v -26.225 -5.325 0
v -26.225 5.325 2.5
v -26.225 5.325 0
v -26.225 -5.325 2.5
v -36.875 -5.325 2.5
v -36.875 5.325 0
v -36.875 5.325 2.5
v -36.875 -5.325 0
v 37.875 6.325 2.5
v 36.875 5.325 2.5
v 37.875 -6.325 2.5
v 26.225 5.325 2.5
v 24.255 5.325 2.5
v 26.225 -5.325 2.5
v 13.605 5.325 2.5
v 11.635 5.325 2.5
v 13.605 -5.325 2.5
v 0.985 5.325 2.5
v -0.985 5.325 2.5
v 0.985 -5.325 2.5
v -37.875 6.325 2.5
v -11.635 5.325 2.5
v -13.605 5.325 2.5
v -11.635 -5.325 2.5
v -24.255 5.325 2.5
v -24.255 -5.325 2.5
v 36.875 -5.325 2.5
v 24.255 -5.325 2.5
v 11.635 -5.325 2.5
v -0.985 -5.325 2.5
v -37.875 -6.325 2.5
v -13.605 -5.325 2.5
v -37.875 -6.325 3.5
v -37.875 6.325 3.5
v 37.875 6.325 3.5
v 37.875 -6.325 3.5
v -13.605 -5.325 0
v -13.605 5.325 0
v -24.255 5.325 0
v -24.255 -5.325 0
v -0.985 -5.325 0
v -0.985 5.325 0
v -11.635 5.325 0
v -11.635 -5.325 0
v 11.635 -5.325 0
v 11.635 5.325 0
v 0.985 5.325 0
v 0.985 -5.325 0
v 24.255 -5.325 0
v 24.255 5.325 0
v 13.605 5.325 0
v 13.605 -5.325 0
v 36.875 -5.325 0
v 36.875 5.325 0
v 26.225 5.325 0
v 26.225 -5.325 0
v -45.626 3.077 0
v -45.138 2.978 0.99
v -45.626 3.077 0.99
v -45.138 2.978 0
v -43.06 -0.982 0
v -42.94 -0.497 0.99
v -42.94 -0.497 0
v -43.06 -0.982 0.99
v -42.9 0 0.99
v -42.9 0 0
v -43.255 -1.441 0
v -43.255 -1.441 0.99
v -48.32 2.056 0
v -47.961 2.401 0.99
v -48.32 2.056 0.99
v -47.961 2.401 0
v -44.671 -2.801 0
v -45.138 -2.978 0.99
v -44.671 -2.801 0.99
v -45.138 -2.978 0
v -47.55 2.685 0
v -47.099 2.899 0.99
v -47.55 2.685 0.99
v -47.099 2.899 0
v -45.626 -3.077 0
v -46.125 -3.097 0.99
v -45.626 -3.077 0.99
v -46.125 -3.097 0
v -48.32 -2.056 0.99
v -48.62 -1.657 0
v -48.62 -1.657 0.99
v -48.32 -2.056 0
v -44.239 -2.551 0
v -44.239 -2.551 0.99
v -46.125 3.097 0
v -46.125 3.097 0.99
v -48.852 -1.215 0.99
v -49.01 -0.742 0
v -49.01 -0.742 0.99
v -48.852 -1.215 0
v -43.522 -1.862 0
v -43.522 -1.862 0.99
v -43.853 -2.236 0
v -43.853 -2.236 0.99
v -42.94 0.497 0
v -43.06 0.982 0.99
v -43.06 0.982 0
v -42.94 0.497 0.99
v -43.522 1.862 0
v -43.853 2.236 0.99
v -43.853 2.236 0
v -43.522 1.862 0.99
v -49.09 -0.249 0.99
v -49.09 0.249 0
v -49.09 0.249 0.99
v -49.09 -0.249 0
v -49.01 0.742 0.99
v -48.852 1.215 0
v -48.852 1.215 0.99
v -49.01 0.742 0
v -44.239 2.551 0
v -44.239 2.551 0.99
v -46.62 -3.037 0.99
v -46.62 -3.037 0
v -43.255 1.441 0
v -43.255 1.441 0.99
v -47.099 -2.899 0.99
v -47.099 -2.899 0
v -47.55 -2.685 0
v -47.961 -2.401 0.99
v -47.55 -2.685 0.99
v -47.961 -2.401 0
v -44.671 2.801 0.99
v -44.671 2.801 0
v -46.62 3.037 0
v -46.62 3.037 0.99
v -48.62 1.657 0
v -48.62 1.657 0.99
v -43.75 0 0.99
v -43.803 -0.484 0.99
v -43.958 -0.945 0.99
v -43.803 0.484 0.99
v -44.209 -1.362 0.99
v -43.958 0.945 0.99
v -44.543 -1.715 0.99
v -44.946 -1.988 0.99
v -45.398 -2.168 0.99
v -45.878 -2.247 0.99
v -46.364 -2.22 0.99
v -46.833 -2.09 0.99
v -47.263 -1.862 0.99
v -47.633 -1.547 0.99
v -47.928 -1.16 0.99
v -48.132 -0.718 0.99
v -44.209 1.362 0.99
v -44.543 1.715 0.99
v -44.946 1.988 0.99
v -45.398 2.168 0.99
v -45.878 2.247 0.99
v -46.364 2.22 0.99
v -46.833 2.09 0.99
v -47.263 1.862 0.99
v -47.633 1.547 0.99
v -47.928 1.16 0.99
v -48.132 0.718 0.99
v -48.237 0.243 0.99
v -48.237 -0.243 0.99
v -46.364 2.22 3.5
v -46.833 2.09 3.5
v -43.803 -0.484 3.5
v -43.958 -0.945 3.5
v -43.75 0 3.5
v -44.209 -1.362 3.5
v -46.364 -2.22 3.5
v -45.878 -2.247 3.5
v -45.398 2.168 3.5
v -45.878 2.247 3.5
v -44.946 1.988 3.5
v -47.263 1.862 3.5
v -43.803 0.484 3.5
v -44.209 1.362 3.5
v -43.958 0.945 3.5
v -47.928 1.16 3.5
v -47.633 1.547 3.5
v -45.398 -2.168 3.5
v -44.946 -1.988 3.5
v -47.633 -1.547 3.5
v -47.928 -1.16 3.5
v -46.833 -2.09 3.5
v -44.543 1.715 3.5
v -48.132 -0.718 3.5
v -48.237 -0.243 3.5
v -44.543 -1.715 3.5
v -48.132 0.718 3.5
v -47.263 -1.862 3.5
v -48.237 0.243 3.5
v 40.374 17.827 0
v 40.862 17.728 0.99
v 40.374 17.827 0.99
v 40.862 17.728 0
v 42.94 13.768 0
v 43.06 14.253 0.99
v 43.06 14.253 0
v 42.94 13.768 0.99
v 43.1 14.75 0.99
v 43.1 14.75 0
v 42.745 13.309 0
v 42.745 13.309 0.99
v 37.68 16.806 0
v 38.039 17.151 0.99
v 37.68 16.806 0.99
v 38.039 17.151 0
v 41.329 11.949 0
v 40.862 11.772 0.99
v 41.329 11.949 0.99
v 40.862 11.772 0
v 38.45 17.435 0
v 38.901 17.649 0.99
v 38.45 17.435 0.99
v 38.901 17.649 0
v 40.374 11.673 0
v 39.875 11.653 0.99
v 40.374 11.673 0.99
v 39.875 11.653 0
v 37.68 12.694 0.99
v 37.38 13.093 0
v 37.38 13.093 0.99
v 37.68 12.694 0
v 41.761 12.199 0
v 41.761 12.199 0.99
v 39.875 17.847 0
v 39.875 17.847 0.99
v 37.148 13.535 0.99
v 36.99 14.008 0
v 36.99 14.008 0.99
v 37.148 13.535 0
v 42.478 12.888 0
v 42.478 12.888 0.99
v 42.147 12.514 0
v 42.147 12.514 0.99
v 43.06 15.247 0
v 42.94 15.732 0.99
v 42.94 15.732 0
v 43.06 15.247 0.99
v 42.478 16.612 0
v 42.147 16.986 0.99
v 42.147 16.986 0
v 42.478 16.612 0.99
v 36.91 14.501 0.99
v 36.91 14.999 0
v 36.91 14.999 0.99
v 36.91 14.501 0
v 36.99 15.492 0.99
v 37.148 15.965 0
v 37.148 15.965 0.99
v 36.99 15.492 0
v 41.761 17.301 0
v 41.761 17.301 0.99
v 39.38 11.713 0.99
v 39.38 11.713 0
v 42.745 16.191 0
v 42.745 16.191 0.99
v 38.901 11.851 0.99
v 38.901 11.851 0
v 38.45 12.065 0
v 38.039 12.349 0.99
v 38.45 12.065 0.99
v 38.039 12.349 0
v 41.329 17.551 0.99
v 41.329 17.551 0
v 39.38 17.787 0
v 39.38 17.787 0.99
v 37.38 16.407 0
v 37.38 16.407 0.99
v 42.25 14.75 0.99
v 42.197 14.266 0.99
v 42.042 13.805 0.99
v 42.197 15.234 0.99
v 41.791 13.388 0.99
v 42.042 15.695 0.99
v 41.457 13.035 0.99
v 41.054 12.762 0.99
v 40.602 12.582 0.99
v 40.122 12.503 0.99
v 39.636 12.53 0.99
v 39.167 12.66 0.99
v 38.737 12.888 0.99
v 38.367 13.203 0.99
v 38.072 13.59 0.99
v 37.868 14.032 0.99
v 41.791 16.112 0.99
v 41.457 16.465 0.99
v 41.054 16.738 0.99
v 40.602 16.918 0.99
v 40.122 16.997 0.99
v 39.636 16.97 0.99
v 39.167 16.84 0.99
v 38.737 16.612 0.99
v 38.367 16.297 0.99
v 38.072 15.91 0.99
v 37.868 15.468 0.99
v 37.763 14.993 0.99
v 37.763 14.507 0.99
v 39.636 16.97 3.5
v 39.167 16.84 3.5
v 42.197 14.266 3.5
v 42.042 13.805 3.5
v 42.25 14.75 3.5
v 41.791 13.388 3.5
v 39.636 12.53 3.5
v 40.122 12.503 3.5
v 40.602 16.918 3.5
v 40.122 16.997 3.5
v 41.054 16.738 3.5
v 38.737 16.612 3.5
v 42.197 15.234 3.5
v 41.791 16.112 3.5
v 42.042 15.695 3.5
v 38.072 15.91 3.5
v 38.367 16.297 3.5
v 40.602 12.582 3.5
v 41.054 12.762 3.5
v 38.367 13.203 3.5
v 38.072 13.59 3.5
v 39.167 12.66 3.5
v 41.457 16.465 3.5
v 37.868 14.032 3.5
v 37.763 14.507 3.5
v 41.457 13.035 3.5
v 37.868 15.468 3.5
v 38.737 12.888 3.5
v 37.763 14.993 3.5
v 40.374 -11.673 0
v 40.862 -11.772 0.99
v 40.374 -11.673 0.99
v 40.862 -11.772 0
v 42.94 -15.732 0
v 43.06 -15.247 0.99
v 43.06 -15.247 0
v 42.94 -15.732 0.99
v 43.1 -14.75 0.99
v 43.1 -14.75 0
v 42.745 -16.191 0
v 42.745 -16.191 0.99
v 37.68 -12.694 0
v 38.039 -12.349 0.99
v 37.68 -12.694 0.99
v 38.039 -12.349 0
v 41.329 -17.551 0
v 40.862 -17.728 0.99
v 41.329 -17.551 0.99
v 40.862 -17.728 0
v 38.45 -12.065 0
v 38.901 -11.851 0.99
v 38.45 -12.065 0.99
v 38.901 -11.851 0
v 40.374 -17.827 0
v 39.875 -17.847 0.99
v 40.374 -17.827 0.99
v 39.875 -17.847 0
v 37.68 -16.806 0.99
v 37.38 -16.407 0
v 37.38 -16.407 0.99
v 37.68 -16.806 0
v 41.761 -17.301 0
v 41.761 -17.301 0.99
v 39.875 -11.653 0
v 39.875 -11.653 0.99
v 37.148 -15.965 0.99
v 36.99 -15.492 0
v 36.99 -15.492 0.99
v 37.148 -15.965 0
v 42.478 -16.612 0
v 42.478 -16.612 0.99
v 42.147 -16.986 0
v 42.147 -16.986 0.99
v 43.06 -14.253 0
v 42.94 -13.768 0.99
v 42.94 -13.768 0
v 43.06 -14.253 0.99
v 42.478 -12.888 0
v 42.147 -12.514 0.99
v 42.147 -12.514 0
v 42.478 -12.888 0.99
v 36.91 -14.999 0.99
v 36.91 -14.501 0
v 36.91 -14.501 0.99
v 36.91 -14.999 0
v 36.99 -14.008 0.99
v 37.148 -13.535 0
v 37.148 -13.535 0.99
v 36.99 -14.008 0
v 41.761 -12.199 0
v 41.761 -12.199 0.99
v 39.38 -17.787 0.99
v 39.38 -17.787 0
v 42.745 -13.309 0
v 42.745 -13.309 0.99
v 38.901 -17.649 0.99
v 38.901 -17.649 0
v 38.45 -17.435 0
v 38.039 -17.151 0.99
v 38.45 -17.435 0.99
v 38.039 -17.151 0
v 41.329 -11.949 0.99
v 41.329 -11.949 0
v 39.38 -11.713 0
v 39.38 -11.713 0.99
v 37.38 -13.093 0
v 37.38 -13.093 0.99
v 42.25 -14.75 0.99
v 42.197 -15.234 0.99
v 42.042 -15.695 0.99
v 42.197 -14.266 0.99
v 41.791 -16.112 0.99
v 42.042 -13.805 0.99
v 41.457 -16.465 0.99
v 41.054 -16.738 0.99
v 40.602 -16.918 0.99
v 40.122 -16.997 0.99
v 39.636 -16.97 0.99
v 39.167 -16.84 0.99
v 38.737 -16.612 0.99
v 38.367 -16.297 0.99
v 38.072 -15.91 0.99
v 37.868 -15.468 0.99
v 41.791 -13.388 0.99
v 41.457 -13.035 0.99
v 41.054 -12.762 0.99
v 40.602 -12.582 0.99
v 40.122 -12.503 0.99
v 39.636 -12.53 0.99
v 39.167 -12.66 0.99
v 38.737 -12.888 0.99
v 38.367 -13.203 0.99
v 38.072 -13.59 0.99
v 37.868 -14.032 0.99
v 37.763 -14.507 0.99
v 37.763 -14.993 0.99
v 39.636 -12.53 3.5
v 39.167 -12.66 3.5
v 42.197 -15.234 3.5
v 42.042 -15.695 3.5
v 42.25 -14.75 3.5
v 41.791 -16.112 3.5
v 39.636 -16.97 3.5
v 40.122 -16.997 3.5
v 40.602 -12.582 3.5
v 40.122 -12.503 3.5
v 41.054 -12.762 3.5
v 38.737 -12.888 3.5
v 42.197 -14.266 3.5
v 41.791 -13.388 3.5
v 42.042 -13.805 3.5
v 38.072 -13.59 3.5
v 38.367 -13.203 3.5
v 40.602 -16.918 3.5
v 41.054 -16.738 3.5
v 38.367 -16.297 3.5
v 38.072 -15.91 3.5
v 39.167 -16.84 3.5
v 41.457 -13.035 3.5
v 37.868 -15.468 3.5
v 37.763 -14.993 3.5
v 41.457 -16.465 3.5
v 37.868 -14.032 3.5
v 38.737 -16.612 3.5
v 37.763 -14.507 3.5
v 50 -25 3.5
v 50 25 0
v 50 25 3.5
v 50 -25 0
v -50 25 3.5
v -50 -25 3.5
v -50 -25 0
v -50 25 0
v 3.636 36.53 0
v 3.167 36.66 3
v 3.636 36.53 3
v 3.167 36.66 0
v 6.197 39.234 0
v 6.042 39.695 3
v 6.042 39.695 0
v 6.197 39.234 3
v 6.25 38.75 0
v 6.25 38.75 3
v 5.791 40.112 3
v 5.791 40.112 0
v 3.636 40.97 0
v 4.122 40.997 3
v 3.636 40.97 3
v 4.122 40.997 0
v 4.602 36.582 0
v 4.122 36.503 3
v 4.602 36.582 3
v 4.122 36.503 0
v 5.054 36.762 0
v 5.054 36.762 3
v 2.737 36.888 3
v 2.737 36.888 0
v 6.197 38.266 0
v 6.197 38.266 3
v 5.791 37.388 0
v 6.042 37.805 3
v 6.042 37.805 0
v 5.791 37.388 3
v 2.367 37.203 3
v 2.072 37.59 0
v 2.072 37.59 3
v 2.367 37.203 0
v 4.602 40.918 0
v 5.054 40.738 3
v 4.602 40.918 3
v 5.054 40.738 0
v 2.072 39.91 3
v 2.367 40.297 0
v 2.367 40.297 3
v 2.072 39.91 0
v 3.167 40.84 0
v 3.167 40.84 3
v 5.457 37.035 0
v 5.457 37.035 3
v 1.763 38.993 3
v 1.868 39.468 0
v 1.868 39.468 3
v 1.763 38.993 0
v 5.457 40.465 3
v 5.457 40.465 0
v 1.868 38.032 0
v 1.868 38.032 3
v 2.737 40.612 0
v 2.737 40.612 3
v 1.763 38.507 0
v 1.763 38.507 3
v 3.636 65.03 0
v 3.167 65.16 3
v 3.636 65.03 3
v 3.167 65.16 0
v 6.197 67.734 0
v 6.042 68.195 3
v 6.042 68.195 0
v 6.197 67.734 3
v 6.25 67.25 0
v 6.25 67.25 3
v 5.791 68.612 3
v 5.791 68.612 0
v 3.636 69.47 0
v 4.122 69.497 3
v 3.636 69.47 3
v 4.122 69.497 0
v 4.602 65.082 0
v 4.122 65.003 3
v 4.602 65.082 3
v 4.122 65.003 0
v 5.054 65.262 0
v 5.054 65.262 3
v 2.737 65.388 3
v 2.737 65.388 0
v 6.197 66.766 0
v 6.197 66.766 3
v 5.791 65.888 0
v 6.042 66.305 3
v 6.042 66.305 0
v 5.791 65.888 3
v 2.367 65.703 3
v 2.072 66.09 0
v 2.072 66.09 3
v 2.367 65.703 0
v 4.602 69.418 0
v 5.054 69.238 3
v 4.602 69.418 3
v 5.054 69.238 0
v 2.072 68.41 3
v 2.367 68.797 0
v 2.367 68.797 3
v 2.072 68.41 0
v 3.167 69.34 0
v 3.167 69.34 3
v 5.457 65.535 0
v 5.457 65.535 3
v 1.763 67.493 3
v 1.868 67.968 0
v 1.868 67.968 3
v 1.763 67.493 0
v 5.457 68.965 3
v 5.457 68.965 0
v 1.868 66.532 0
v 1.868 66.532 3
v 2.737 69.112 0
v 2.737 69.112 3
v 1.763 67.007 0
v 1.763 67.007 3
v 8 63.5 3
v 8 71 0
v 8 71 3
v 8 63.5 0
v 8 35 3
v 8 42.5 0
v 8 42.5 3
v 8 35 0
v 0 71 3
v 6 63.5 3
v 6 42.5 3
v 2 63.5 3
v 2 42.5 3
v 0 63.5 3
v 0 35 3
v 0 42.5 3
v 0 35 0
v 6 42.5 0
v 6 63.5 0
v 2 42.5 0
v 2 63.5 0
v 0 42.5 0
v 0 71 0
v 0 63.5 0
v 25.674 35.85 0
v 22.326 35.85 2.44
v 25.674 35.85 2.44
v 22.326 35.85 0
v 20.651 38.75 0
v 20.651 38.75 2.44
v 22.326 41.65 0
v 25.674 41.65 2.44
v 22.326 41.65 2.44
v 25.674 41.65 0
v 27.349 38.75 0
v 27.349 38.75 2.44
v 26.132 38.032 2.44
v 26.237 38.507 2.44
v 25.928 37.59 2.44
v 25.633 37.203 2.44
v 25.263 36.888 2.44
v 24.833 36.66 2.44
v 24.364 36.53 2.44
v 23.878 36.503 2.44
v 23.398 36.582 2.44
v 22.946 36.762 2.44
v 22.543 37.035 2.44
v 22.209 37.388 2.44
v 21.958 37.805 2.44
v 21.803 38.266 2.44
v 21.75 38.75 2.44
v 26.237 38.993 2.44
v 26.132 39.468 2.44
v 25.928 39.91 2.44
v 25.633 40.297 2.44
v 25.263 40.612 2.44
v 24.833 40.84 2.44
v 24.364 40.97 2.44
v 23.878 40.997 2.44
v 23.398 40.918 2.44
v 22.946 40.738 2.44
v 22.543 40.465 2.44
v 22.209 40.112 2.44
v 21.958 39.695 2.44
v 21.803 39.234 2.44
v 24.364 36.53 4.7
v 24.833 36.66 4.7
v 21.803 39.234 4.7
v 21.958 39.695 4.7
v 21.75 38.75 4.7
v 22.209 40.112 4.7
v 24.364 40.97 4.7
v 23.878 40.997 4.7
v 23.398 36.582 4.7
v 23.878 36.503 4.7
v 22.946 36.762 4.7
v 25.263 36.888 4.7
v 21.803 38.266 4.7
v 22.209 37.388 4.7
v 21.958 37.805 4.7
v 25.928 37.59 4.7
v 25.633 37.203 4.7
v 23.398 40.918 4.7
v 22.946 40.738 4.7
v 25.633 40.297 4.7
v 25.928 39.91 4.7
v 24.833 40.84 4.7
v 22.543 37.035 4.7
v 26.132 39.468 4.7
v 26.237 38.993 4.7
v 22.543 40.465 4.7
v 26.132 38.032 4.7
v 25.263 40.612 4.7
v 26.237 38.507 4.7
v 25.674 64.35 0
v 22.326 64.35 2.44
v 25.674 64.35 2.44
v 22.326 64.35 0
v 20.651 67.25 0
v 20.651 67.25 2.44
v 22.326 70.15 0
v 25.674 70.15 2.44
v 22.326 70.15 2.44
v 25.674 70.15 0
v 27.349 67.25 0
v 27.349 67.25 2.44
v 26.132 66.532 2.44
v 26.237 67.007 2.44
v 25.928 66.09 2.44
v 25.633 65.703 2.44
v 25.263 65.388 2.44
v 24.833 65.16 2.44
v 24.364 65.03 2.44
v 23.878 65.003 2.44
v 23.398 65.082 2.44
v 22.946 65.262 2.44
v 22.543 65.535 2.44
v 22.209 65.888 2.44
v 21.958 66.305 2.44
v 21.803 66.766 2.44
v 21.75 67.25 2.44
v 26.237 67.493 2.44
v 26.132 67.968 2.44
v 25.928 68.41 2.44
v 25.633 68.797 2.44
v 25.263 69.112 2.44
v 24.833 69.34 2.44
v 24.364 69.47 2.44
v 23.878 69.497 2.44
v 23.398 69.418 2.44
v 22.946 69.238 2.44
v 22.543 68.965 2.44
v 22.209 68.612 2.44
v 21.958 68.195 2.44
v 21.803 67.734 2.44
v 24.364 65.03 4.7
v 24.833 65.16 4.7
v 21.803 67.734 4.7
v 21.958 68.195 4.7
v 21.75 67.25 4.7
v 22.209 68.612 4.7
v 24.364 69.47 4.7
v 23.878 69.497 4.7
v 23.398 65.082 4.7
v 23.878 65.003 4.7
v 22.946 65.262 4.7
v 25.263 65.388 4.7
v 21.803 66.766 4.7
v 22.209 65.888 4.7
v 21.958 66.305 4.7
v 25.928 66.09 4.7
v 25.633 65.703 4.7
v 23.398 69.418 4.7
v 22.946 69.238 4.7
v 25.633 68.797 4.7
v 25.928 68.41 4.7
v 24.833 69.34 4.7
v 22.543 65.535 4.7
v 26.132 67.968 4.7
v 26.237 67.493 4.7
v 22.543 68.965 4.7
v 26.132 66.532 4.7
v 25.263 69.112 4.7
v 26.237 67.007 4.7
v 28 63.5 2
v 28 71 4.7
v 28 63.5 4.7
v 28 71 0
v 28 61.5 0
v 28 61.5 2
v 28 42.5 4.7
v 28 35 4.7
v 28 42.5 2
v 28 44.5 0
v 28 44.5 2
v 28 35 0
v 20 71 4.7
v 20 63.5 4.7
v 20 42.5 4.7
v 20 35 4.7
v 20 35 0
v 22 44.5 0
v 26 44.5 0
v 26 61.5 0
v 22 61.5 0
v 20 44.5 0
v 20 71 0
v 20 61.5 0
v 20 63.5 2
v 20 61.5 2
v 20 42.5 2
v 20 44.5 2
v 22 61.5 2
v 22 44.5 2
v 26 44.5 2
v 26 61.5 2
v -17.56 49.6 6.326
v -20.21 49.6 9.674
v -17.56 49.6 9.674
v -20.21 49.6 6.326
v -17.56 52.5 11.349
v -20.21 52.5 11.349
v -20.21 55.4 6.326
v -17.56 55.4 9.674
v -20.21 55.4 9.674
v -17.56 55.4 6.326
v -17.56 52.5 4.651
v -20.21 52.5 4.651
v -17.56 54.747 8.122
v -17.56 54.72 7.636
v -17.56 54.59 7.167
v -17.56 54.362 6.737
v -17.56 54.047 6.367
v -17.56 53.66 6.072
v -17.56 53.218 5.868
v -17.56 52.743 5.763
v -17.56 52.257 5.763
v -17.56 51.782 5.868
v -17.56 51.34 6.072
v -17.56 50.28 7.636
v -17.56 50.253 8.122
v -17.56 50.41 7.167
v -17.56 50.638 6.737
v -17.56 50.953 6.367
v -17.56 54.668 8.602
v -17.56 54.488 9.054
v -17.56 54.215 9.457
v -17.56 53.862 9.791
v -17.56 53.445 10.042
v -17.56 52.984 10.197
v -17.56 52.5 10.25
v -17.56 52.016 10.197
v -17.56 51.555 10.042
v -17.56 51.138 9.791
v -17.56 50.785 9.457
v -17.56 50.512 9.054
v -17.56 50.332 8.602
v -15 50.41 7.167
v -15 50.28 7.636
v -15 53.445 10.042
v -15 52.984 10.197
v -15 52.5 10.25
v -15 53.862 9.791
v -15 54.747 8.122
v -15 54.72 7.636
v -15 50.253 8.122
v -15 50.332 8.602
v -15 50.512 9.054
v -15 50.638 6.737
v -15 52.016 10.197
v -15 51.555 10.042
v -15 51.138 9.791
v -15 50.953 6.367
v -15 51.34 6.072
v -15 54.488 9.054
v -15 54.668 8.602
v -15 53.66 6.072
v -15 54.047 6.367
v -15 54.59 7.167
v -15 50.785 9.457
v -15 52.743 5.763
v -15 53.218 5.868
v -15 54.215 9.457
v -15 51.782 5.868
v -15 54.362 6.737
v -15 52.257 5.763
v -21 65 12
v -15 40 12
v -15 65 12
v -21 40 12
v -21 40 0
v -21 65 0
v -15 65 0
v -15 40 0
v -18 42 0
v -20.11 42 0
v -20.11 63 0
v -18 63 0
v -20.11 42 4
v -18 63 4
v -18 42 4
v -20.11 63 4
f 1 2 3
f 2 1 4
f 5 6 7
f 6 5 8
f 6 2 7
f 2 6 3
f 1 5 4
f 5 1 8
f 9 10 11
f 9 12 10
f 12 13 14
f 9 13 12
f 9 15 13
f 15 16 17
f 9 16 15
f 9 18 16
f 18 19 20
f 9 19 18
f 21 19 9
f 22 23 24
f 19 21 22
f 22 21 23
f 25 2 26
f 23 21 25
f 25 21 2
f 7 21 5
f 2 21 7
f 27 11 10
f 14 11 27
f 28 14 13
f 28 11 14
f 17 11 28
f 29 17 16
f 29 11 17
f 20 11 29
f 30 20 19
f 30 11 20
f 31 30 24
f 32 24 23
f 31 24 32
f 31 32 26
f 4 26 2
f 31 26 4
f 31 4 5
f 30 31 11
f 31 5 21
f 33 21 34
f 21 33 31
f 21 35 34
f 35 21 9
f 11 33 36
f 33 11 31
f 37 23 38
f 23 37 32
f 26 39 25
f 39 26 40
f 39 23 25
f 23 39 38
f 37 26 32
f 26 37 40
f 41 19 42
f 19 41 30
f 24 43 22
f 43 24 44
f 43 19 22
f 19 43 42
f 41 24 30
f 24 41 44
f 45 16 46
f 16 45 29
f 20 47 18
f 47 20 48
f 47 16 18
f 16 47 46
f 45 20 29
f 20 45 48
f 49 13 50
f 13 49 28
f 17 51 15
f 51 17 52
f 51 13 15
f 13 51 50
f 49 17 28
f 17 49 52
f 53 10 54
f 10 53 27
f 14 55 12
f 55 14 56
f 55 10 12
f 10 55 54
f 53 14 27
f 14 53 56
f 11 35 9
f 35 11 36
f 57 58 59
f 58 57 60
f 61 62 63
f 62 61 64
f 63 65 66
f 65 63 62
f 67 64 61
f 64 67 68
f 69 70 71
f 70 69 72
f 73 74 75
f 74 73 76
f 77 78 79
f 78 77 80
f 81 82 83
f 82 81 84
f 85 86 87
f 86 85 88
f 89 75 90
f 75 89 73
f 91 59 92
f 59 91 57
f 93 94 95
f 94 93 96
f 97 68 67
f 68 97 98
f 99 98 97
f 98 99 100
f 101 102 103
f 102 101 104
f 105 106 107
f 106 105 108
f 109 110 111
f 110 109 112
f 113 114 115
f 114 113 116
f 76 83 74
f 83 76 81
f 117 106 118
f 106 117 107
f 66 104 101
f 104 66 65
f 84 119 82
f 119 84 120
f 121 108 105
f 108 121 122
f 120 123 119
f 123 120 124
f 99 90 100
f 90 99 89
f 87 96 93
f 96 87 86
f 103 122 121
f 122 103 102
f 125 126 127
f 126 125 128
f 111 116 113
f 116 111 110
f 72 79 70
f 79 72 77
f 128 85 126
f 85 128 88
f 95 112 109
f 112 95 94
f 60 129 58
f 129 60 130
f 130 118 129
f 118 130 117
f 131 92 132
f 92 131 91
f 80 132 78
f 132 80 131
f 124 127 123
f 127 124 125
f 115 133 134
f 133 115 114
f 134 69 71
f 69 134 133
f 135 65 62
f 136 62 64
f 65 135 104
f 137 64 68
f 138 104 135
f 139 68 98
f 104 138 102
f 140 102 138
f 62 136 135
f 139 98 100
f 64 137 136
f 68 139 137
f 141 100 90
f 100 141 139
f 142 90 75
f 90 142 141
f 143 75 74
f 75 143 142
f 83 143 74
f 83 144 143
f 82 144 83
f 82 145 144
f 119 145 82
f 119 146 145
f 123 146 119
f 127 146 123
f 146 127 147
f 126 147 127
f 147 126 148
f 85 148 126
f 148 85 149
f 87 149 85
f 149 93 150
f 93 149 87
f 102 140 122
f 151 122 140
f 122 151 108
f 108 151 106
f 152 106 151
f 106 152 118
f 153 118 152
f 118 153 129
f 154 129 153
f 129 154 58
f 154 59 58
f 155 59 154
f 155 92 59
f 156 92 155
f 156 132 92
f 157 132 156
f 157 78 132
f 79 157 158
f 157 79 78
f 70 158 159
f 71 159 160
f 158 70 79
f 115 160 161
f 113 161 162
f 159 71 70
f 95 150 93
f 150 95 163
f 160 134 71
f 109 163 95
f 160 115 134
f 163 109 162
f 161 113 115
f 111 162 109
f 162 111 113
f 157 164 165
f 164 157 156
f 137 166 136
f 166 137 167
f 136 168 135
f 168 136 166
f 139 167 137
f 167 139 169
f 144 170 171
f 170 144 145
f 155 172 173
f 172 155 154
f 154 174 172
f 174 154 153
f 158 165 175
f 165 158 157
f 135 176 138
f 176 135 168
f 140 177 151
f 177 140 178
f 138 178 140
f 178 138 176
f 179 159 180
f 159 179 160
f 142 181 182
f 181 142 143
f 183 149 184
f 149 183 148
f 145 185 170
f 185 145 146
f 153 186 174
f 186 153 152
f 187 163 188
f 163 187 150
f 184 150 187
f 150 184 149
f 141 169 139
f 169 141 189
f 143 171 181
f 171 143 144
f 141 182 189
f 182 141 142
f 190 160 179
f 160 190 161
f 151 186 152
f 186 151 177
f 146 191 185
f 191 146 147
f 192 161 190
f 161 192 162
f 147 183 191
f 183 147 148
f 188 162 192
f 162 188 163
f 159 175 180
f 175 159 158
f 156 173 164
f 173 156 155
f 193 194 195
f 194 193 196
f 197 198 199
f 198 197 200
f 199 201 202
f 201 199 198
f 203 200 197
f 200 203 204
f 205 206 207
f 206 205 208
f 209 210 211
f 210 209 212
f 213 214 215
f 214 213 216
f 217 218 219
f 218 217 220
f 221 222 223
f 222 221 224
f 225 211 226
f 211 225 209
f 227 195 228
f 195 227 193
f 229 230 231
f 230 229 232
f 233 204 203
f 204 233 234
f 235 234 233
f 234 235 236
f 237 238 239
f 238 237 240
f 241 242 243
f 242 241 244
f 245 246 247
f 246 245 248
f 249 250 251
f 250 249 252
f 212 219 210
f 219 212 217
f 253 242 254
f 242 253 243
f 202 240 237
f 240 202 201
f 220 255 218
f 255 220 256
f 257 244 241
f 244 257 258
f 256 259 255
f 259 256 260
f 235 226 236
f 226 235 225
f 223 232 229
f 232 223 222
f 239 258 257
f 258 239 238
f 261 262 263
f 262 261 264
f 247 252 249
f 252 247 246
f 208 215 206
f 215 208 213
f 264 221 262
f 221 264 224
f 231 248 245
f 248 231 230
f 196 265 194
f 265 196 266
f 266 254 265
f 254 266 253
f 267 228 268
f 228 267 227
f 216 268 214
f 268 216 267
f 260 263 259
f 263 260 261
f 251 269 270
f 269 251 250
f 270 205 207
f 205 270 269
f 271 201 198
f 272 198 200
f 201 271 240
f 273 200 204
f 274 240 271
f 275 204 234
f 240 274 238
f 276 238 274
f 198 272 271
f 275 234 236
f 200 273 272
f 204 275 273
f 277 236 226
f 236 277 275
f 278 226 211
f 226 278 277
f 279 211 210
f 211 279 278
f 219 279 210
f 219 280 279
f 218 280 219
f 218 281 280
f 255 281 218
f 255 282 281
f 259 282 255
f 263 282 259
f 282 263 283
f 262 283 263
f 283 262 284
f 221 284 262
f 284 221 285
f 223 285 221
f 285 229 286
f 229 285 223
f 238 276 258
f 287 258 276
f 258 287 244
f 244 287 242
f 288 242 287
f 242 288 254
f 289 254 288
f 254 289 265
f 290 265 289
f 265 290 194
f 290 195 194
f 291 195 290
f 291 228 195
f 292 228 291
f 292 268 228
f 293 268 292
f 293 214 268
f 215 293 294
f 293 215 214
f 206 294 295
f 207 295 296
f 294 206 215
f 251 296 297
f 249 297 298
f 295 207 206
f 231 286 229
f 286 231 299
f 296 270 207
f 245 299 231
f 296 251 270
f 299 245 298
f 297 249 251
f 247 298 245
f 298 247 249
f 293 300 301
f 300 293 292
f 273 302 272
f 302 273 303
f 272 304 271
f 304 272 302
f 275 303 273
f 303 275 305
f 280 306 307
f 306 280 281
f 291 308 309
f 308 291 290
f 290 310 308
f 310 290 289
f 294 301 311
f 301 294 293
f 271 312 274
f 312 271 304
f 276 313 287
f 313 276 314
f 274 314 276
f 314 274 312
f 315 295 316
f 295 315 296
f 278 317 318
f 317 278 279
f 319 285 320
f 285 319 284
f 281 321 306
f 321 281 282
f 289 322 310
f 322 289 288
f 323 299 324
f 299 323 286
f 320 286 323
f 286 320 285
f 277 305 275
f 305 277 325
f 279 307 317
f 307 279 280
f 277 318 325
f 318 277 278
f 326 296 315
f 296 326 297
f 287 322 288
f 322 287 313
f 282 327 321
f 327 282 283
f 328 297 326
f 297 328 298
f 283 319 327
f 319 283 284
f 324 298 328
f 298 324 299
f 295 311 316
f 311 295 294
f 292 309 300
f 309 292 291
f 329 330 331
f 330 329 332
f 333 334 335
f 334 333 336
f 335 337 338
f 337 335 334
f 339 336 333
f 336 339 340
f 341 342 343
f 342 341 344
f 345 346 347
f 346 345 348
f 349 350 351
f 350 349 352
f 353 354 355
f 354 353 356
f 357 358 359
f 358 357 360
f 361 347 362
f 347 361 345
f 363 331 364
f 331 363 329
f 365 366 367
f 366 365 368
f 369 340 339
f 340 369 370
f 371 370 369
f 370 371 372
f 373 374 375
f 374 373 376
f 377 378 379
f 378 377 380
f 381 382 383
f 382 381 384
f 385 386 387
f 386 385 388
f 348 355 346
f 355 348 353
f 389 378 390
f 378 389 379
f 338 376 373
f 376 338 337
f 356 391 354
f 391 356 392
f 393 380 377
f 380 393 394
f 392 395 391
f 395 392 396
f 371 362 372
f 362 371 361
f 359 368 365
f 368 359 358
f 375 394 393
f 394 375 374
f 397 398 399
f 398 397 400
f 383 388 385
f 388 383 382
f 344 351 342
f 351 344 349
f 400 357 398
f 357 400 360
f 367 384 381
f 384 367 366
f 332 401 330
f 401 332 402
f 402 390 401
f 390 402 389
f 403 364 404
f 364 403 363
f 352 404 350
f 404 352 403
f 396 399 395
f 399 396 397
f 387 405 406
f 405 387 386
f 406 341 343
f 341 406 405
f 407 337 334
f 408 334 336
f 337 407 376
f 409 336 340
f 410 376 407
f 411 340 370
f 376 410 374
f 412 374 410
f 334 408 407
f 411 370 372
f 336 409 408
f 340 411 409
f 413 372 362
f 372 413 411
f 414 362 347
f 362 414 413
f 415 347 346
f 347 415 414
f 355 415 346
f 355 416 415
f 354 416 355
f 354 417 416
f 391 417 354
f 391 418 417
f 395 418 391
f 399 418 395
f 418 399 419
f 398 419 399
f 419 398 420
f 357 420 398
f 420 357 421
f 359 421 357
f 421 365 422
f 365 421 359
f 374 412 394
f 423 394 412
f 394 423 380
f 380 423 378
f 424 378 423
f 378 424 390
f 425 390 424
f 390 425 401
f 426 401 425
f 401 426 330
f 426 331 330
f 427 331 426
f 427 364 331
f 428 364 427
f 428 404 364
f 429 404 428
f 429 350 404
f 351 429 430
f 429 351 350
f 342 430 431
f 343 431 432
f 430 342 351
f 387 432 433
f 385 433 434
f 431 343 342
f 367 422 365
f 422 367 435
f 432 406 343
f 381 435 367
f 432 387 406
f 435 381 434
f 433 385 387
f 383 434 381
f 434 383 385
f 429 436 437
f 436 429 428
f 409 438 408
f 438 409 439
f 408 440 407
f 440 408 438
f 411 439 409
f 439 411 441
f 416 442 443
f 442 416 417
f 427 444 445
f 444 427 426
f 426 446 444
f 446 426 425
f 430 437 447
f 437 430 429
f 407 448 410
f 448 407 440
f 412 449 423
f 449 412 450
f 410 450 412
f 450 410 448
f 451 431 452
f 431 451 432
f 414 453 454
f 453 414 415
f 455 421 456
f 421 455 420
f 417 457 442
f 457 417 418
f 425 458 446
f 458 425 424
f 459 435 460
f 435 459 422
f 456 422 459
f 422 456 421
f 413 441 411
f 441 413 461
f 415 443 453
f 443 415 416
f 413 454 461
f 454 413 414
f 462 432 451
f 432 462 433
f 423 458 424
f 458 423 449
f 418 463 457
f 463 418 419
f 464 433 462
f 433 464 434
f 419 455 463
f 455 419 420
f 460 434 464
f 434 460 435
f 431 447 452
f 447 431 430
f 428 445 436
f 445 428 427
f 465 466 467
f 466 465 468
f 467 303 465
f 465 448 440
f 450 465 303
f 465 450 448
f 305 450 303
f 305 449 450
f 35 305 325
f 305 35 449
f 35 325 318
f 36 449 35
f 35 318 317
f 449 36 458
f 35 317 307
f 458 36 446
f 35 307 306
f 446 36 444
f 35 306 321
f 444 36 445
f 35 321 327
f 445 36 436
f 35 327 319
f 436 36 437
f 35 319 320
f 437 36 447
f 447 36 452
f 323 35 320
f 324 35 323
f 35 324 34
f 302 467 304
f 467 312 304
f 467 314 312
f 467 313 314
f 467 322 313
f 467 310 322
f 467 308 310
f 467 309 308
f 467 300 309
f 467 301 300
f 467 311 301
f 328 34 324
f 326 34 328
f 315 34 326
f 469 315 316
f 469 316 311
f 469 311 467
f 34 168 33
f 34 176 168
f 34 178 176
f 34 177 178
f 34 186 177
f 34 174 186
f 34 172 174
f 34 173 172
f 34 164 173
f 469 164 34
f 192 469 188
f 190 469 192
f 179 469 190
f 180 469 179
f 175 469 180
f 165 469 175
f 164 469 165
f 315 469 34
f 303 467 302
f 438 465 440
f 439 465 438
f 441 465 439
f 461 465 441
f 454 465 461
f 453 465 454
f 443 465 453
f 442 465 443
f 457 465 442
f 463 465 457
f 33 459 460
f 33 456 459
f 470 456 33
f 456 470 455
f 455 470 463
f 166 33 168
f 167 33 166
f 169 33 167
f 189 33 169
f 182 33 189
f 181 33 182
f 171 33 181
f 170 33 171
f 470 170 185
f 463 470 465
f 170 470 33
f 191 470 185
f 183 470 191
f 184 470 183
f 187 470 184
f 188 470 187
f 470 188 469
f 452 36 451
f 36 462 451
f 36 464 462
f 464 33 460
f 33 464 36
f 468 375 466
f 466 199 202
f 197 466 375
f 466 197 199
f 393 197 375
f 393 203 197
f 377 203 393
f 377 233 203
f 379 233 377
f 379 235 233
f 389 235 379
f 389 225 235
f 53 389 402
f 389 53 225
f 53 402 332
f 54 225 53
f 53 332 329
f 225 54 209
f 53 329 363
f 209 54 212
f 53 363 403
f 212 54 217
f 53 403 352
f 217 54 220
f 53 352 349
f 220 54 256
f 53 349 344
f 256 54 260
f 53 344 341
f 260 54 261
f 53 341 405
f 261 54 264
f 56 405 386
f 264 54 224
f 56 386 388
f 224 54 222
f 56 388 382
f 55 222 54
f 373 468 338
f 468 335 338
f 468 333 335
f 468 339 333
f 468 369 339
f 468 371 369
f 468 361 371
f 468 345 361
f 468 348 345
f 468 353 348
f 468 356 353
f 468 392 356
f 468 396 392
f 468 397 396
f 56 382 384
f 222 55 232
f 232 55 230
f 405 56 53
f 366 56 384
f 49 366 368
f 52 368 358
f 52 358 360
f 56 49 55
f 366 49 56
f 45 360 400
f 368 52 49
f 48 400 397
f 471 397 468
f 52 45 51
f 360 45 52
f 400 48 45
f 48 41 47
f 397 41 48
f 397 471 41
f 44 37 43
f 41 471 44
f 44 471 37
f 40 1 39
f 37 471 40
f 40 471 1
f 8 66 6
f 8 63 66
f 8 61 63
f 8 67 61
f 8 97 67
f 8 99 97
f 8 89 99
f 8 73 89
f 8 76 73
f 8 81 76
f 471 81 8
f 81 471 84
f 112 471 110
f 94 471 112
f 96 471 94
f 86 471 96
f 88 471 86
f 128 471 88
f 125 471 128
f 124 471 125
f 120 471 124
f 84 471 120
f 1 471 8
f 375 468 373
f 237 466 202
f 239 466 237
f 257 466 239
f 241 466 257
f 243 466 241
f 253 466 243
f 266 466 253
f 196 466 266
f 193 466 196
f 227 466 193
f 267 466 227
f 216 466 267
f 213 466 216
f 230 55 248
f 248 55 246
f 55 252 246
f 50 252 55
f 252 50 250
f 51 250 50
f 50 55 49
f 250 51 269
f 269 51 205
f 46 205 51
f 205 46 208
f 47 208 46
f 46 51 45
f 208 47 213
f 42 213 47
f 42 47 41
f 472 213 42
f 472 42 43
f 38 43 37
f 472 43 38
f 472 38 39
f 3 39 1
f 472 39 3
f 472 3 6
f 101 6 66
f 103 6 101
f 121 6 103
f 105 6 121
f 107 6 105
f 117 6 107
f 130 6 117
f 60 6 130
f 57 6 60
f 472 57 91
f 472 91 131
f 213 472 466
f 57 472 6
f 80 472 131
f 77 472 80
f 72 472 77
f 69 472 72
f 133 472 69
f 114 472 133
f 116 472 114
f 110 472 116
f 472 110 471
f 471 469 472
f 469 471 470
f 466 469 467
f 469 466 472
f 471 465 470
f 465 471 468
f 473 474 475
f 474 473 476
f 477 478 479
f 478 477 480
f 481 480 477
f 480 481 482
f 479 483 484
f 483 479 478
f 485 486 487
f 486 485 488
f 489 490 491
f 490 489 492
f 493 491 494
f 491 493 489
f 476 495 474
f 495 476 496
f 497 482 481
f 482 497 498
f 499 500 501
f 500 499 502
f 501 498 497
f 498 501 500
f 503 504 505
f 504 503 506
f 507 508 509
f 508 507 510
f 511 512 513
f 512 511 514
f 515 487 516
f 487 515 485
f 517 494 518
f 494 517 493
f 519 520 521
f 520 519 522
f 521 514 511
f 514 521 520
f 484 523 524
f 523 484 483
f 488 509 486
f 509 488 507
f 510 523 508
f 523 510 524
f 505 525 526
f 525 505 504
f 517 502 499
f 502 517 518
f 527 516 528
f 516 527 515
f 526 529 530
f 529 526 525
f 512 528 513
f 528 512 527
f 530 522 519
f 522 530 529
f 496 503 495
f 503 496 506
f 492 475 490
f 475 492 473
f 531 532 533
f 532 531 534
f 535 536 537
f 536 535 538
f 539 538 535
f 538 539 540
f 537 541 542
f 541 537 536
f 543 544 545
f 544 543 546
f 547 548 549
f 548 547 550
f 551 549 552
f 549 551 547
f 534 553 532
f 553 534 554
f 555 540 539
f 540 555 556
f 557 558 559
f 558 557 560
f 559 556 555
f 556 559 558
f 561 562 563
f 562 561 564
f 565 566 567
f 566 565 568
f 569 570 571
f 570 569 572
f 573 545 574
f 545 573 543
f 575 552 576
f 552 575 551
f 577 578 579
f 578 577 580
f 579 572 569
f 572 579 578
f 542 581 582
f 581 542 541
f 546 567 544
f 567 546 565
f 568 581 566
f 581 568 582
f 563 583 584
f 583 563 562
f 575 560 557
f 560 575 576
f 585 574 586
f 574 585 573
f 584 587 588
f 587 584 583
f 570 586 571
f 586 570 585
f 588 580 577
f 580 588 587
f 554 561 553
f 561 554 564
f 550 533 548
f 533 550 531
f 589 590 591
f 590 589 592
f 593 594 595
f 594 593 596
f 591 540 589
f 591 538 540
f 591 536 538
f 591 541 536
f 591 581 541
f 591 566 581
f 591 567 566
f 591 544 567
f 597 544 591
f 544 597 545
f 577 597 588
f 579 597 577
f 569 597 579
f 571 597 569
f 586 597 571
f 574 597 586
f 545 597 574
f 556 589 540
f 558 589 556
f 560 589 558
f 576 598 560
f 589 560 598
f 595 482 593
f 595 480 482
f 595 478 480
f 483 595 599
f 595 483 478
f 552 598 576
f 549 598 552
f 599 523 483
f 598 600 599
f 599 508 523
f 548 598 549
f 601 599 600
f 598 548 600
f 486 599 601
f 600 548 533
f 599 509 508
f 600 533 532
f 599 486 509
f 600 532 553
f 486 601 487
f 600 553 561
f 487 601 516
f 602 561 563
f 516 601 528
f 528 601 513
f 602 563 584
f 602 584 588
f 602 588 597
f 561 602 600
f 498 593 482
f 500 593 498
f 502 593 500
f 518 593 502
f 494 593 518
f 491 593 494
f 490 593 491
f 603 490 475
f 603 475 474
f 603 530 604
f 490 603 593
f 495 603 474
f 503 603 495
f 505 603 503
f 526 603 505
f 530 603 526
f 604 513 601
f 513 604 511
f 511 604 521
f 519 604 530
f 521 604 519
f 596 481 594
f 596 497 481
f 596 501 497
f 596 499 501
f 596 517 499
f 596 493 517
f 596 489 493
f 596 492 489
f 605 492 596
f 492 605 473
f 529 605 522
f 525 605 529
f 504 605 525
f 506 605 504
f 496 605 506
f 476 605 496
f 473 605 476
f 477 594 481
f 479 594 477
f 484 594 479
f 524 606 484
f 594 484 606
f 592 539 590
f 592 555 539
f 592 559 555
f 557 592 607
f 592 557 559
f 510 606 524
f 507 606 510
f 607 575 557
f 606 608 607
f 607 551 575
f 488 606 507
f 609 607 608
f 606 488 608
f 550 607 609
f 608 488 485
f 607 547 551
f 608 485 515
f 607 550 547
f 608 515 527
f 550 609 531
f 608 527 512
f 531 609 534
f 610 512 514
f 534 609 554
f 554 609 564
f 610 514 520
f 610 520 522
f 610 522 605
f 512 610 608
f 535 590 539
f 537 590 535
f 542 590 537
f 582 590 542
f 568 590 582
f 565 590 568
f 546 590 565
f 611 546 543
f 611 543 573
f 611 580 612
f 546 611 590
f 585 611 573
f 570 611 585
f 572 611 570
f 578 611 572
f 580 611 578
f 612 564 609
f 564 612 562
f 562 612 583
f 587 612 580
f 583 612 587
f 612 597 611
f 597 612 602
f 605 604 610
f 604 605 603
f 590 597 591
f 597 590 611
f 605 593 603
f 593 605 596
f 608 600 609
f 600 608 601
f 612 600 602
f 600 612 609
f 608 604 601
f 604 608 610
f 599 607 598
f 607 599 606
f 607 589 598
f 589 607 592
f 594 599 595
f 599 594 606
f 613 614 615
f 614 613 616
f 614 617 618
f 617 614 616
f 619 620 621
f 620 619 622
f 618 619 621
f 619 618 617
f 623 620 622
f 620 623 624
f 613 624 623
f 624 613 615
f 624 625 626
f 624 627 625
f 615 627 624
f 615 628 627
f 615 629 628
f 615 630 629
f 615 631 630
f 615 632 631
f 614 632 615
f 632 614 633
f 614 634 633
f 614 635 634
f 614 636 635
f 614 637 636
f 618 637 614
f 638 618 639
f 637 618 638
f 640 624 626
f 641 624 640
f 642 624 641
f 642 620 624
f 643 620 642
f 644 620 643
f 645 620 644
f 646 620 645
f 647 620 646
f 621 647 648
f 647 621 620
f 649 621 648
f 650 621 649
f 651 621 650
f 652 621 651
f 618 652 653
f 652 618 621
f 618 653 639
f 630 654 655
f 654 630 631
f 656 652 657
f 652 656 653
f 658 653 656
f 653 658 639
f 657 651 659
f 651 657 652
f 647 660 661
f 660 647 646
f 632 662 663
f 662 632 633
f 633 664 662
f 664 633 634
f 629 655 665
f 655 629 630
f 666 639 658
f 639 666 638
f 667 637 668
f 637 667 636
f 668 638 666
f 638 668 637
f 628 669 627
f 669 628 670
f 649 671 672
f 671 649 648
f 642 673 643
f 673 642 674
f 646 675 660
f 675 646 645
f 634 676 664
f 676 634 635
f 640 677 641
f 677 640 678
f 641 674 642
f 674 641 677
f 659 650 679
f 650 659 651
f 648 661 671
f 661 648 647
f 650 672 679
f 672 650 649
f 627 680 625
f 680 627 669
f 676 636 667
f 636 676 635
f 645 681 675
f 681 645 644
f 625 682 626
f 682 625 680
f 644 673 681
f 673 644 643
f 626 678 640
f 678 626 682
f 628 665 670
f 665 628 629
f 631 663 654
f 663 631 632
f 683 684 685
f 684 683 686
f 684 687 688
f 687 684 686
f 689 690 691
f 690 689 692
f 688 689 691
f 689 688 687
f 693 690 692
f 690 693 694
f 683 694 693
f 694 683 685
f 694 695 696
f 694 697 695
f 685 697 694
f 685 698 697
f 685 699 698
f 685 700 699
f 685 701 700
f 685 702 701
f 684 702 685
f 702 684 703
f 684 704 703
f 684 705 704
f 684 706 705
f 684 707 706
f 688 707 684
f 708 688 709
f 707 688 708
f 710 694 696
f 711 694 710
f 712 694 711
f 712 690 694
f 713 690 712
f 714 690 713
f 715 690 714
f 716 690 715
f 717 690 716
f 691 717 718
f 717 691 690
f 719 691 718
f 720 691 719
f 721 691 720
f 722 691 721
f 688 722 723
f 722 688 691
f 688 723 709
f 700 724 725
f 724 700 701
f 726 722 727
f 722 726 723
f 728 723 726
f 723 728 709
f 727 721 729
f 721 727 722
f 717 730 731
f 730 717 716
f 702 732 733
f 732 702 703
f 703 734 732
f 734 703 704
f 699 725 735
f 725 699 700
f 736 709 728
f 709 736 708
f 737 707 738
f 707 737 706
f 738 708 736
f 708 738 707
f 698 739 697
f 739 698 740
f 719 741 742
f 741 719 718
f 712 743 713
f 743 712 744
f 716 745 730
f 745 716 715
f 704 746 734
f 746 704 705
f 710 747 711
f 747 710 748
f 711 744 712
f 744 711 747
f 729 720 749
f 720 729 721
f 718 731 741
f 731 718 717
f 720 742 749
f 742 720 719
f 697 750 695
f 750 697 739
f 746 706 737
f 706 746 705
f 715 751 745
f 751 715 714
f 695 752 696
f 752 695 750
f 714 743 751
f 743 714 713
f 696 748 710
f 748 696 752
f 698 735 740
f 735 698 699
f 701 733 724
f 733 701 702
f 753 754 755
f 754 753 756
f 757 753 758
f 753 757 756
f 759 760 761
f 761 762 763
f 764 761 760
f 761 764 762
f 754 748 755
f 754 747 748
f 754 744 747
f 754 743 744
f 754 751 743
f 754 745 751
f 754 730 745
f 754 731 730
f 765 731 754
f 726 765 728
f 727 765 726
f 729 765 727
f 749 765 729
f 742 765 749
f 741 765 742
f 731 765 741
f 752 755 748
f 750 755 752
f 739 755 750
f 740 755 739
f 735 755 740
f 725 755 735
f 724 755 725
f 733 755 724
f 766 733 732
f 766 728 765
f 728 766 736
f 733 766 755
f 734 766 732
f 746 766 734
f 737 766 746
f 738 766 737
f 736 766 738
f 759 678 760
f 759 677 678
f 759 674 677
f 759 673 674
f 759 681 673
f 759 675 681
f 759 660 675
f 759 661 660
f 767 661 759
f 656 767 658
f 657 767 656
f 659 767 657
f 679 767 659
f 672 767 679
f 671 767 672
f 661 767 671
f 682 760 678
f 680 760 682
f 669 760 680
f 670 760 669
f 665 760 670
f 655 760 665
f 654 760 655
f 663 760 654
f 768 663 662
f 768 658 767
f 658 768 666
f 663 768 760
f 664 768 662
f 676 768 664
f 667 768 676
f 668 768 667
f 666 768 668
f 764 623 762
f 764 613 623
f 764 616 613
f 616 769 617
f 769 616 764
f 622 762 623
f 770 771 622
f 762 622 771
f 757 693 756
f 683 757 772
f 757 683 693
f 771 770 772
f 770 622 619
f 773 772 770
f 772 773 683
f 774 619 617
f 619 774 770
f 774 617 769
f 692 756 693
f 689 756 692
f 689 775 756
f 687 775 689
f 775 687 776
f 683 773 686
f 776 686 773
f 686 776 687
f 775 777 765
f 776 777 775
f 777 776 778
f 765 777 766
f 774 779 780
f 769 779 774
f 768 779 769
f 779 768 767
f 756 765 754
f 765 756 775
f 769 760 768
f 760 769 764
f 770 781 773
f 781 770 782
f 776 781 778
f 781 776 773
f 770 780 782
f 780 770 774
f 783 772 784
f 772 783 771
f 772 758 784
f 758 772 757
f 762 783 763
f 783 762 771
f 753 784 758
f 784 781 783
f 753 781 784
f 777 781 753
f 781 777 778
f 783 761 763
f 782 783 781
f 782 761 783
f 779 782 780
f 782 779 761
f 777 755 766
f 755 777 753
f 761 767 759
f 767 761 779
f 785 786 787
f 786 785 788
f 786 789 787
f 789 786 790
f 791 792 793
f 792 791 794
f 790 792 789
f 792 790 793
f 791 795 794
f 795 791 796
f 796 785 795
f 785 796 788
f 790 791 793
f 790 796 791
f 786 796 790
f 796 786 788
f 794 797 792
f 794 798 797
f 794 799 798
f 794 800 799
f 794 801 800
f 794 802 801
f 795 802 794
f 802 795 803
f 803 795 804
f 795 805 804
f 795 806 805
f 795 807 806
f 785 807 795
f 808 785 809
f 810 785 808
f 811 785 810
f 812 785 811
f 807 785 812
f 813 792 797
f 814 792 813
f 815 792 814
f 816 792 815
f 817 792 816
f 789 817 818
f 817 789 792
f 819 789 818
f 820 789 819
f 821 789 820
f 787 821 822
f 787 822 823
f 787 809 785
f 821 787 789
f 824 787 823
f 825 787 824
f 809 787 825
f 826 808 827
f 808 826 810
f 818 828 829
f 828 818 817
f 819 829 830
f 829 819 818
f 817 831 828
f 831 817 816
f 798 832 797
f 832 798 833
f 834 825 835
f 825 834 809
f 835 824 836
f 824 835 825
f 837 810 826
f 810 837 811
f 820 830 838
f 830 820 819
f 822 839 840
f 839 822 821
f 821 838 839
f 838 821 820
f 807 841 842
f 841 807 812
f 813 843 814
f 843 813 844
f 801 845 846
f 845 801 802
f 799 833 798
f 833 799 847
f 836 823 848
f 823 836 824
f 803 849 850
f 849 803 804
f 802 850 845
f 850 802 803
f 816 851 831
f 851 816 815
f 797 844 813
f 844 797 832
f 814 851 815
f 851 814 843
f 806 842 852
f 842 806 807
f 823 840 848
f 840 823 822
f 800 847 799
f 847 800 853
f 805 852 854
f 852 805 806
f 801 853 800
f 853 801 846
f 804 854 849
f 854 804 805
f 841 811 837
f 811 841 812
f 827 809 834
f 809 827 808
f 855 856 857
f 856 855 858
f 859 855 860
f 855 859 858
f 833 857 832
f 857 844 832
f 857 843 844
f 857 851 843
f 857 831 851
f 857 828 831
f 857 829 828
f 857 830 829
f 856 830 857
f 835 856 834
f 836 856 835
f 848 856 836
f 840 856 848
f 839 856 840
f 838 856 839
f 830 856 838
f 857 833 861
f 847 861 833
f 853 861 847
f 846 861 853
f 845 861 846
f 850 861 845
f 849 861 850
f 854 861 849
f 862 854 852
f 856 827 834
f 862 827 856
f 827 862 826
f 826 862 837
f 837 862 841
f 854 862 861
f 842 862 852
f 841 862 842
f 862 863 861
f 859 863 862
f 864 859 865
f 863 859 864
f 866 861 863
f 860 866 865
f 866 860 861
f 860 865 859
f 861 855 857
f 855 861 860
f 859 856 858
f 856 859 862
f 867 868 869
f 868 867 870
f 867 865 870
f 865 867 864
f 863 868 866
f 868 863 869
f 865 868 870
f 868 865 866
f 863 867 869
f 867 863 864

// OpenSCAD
// file: lib/Metric/Polygon.scad
//============================================================
// OpenSCAD
// Regular Convex Polygon Library
// Last Modified : 2015/10/28
//============================================================
/*

	Definition

	N = Number of Side N >=3
	A = apothem
		radius of inside circle
	R = circumradius
		Radius of outside circle
	S = Side
		Lenght of a side

	Build polygon with the Apothem :
	N and A is known
	Need to calculate S then R
	use $fn

	Build Polygon with Circumradius
	N and R known
	use $fn

	Build Polygon with Side
	N and S Known
	Need to calculate R and optionaly A
	use $fn	

	TO DO
    Control result

	For more information :
	http://en.wikipedia.org/wiki/Regular_polygon

*/

//------------------------------------------------------------
//
//------------------------------------------------------------
Demo();

//------------------------------------------------------------
// Demo
//------------------------------------------------------------
module Demo()
{
	inch = 25.4;	// 25.4mm
	// A = apothem - it's a RADIUS !
	// For a bolt of 4 inches spécify A=2*inch
	//Polygon(N=7,A=2*inch,h=0);	// 4 inches radius Polygon
	//Polygon(N=7,A=49.8365,h=0);
	//Trigon(A=50,h=10);			// N=3
	//Dodecagon(A=50,h=0);			// N=12

    //rotate([0,0,360/7/2])
	//Nonagon(R=55.3144,h=10,debug=true);

	//Polygon(N=6,A=60,h=0,debug=false);
	//Polygon(N=6,A=60,h=5,debug=true);

    Enneagon(A=50);
}


//------------------------------------------------------------
// Polygon : 
//------------------------------------------------------------
module Polygon(N=3,A=0,R=0,S=0,h=0,debug=false)
{
	N = ( N < 3 ? 3 : N );

	angle = 360/N;
	angleA = angle/2;

	if (debug)
	{
		echo("N = ", N);
		echo("A = ", A);
		echo("S = ", S);
		echo("R = ", R);
	}

	if ( A > 0 )		// if A assign R and S
	{
        S = 2 * A * tan(angleA);							// assign
		//R = (S/2) / sin(angleA);						// no assign ???
		R = ( A * tan(angleA) ) / sin(angleA);		// asign
		_Build_Polygon(N=N,R=R,h=h);
		if (debug)
		{
			echo("aN = ", N);
			echo("aA = ", A);
			echo("aS = ", S);
			echo("aR = ", R);
			#cylinder(r=A,h=h+1,center=true,$fn=150);
			%cylinder(r=R,h=h+1,center=true,$fn=150);
		}
	}
	else
	{
		if ( S > 0 )		// if S assign R and A
		{
			R = (S/2) / sin(angleA);			// assign
			A = S / ( 2 * tan(angleA) );		// assign
            _Build_Polygon(N=N,R=R,h=h);
			if (debug)
			{
				echo("sN = ", N);
				echo("sA = ", A);
				echo("sS = ", S);
				echo("sR = ", R);
				#cylinder(r=A,h=h+1,center=true,$fn=150);
				%cylinder(r=R,h=h+1,center=true,$fn=150);
			}
		}
		else
		{
			if ( R == 0 )		// default
			{
				S = 2 * R * sin(angleA);			// no assign ???
				A = S / ( 2 * tan(angleA) );		// no assign ???
				_Build_Polygon(N=N,h=h);
				if (debug)
				{
					echo("0N = ", N);
					echo("0A = ", A);
					echo("0S = ", S);
					echo("0R = ", R);
					#cylinder(r=A,h=h+1,center=true,$fn=150);
					%cylinder(r=R,h=h+1,center=true,$fn=150);
				}
			}
			else		// build with R
			{
				S = 2 * R * sin(angleA);
				A = S / ( 2 * tan(angleA) );			// no assign ???
				//A = R * ( sin(angleA) / tan(angleA) )	// no assign ???
				_Build_Polygon(N=N,R=R,h=h);
				if (debug)
				{
					echo("rN = ", N);
					echo("rA = ", A);
					echo("rS = ", S);
					echo("rR = ", R);
					%cylinder(r=R,h=h+1,center=true,$fn=150);
				}
			}
		}
	}

	if (debug)
	{
		echo("fN = ", N);
		echo("fA = ", A);
		echo("fS = ", S);
		echo("fR = ", R);
	}
}

//------------------------------------------------------------
// Build
//------------------------------------------------------------
module _Build_Polygon(N=3,R=1,h=0)
{
	if (h > 0)
	{
		// 3D primitive h>0
		cylinder(r=R,h=h,$fn=N,center=true);
	}
	else
	{
		// 2D primitive h=0
		circle(r=R,$fn=N,center=true);
	}
}

//------------------------------------------------------------
// Building lots from N=3, N=N+1
// http://en.wikipedia.org/wiki/Polygon
//------------------------------------------------------------

// 3 sides
module Trigon(A=0,R=0,S=0,h=0,debug=false)
	{Polygon(N=3,A=A,R=R,S=S,h=h,debug=debug);}

module Triangle(A=0,R=0,S=0,h=0,debug=false)
	{Polygon(N=3,A=A,R=R,S=S,h=h,debug=debug);}

// 4 sides
module Tetragon(A=0,R=0,S=0,h=0,debug=false)
	{Polygon(N=4,A=A,R=R,S=S,h=h,debug=debug);}

module Quadrilateral(A=0,R=0,S=0,h=0,debug=false)
	{Polygon(N=4,A=A,R=R,S=S,h=h,debug=debug);}

module Quadrangle(A=0,R=0,S=0,h=0,debug=false)
	{Polygon(N=4,A=A,R=R,S=S,h=h,debug=debug);}

// 5 sides
module Pentagon(A=0,R=0,S=0,h=0,debug=false)
	{Polygon(N=5,A=A,R=R,S=S,h=h,debug=debug);}

// 6 sides
module Hexagon(A=0,R=0,S=0,h=0,debug=false)
	{Polygon(N=6,A=A,R=R,S=S,h=h,debug=debug);}

// 7 sides
module Heptagon(A=0,R=0,S=0,h=0,debug=false)
	{Polygon(N=7,A=A,R=R,S=S,h=h,debug=debug);}

// 8 sides
module Octagon(A=0,R=0,S=0,h=0,debug=false)
	{Polygon(N=8,A=A,R=R,S=S,h=h,debug=debug);}

// 9 sides
module Enneagon(A=0,R=0,S=0,h=0,debug=false)
	{Polygon(N=9,A=A,R=R,S=S,h=h,debug=debug);}

module Nonagon(A=0,R=0,S=0,h=0,debug=false)
	{Polygon(N=9,A=A,R=R,S=S,h=h,debug=debug);}

// 10 sides
module Decagon(A=0,R=0,S=0,h=0,debug=false)
	{Polygon(N=10,A=A,R=R,S=S,h=h,debug=debug);}

// 11 sides
module Handecagon(A=0,R=0,S=0,h=0,debug=false)
	{Polygon(N=11,A=A,R=R,S=S,h=h,debug=debug);}

// 12 sides
module Dodecagon(A=0,R=0,S=0,h=0,debug=false)
	{Polygon(N=12,A=A,R=R,S=S,h=h,debug=debug);}

// ...

// 100 sides
module Hectogon(A=0,R=0,S=0,h=0,debug=false)
	{Polygon(N=100,A=A,R=R,S=S,h=h,debug=debug);}

//==EOF=======================================================
// file: lib/Metric/Bolt.scad
include <defaults.scad>;

module Bolt(
  l=10,
  h_head=5,
  d_head=10,
  d=5,
  tolerance=default_metric_tolerance,
  inset=1,
  extra_tolerance=default_bolt_extra_tolerance
) {
  r_head = d_head/2;
  r = d/2;

  translate([0, 0, -inset*h_head]){
    translate([0, 0, 0.01])
    cylinder(r=r_head+tolerance*2, h=h_head);

    translate([0, 0, -l+0.01])
    cylinder(r=r+tolerance*2+extra_tolerance, h=l+0.01);
  }
}
// file: lib/Metric/Nut.scad
include <defaults.scad>;
use <Polygon.scad>;

module Nut(
  h=10,
  l=10,
  A=10,
  d=5,
  tolerance=default_metric_tolerance,
  extra_tolerance=default_bolt_extra_tolerance,
  inset=1
) {
  r = d/2;  
  translate([0, 0, -h/2+0.01+((1-inset)*h)])
  Hexagon(
    A=A+tolerance,
    h=h+tolerance*2
  );
    
    translate([0, 0, -l+0.01])
    cylinder(r=r+tolerance*2+extra_tolerance, h=l+0.01);
}
// file: lib/Metric/defaults.scad
default_metric_tolerance = 0.2;
default_bolt_extra_tolerance = 0.35;
// file: lib/Metric/M3.scad
include <defaults.scad>;
use <Nut.scad>;
use <Bolt.scad>;

h_nut_m3 = 2.25;
a_nut_m3 = 5.4;
A_nut_m3 = a_nut_m3 / 2;
d_head_m3 = 5.4;
h_head_m3 = 3.2;
d_m3 = 3;

module NutM3(tolerance=default_metric_tolerance, h=h_nut_m3, inset=1,l=10) {
  Nut(h=h, l=l,A=A_nut_m3,d=d_m3, tolerance=tolerance, inset=inset);
}

module BoltM3(l=10, tolerance=default_metric_tolerance, inset=1) {
  Bolt(l=l, h_head=h_head_m3, d_head=d_head_m3, d=d_m3, tolerance=tolerance, inset=inset);
}
// main file
use <buttons.scad>;

difference(){
    surface(PCBWidth = 40);
    keyHole(holes=1,type="2080");
}

translate([0,35,0])
    mountPCBConnectorSplit([80,20,1.61]); 

translate([-15,40,0])
    rotate([0,-90,0])
    mountPCBHolder([80,20,1.61]);
    
